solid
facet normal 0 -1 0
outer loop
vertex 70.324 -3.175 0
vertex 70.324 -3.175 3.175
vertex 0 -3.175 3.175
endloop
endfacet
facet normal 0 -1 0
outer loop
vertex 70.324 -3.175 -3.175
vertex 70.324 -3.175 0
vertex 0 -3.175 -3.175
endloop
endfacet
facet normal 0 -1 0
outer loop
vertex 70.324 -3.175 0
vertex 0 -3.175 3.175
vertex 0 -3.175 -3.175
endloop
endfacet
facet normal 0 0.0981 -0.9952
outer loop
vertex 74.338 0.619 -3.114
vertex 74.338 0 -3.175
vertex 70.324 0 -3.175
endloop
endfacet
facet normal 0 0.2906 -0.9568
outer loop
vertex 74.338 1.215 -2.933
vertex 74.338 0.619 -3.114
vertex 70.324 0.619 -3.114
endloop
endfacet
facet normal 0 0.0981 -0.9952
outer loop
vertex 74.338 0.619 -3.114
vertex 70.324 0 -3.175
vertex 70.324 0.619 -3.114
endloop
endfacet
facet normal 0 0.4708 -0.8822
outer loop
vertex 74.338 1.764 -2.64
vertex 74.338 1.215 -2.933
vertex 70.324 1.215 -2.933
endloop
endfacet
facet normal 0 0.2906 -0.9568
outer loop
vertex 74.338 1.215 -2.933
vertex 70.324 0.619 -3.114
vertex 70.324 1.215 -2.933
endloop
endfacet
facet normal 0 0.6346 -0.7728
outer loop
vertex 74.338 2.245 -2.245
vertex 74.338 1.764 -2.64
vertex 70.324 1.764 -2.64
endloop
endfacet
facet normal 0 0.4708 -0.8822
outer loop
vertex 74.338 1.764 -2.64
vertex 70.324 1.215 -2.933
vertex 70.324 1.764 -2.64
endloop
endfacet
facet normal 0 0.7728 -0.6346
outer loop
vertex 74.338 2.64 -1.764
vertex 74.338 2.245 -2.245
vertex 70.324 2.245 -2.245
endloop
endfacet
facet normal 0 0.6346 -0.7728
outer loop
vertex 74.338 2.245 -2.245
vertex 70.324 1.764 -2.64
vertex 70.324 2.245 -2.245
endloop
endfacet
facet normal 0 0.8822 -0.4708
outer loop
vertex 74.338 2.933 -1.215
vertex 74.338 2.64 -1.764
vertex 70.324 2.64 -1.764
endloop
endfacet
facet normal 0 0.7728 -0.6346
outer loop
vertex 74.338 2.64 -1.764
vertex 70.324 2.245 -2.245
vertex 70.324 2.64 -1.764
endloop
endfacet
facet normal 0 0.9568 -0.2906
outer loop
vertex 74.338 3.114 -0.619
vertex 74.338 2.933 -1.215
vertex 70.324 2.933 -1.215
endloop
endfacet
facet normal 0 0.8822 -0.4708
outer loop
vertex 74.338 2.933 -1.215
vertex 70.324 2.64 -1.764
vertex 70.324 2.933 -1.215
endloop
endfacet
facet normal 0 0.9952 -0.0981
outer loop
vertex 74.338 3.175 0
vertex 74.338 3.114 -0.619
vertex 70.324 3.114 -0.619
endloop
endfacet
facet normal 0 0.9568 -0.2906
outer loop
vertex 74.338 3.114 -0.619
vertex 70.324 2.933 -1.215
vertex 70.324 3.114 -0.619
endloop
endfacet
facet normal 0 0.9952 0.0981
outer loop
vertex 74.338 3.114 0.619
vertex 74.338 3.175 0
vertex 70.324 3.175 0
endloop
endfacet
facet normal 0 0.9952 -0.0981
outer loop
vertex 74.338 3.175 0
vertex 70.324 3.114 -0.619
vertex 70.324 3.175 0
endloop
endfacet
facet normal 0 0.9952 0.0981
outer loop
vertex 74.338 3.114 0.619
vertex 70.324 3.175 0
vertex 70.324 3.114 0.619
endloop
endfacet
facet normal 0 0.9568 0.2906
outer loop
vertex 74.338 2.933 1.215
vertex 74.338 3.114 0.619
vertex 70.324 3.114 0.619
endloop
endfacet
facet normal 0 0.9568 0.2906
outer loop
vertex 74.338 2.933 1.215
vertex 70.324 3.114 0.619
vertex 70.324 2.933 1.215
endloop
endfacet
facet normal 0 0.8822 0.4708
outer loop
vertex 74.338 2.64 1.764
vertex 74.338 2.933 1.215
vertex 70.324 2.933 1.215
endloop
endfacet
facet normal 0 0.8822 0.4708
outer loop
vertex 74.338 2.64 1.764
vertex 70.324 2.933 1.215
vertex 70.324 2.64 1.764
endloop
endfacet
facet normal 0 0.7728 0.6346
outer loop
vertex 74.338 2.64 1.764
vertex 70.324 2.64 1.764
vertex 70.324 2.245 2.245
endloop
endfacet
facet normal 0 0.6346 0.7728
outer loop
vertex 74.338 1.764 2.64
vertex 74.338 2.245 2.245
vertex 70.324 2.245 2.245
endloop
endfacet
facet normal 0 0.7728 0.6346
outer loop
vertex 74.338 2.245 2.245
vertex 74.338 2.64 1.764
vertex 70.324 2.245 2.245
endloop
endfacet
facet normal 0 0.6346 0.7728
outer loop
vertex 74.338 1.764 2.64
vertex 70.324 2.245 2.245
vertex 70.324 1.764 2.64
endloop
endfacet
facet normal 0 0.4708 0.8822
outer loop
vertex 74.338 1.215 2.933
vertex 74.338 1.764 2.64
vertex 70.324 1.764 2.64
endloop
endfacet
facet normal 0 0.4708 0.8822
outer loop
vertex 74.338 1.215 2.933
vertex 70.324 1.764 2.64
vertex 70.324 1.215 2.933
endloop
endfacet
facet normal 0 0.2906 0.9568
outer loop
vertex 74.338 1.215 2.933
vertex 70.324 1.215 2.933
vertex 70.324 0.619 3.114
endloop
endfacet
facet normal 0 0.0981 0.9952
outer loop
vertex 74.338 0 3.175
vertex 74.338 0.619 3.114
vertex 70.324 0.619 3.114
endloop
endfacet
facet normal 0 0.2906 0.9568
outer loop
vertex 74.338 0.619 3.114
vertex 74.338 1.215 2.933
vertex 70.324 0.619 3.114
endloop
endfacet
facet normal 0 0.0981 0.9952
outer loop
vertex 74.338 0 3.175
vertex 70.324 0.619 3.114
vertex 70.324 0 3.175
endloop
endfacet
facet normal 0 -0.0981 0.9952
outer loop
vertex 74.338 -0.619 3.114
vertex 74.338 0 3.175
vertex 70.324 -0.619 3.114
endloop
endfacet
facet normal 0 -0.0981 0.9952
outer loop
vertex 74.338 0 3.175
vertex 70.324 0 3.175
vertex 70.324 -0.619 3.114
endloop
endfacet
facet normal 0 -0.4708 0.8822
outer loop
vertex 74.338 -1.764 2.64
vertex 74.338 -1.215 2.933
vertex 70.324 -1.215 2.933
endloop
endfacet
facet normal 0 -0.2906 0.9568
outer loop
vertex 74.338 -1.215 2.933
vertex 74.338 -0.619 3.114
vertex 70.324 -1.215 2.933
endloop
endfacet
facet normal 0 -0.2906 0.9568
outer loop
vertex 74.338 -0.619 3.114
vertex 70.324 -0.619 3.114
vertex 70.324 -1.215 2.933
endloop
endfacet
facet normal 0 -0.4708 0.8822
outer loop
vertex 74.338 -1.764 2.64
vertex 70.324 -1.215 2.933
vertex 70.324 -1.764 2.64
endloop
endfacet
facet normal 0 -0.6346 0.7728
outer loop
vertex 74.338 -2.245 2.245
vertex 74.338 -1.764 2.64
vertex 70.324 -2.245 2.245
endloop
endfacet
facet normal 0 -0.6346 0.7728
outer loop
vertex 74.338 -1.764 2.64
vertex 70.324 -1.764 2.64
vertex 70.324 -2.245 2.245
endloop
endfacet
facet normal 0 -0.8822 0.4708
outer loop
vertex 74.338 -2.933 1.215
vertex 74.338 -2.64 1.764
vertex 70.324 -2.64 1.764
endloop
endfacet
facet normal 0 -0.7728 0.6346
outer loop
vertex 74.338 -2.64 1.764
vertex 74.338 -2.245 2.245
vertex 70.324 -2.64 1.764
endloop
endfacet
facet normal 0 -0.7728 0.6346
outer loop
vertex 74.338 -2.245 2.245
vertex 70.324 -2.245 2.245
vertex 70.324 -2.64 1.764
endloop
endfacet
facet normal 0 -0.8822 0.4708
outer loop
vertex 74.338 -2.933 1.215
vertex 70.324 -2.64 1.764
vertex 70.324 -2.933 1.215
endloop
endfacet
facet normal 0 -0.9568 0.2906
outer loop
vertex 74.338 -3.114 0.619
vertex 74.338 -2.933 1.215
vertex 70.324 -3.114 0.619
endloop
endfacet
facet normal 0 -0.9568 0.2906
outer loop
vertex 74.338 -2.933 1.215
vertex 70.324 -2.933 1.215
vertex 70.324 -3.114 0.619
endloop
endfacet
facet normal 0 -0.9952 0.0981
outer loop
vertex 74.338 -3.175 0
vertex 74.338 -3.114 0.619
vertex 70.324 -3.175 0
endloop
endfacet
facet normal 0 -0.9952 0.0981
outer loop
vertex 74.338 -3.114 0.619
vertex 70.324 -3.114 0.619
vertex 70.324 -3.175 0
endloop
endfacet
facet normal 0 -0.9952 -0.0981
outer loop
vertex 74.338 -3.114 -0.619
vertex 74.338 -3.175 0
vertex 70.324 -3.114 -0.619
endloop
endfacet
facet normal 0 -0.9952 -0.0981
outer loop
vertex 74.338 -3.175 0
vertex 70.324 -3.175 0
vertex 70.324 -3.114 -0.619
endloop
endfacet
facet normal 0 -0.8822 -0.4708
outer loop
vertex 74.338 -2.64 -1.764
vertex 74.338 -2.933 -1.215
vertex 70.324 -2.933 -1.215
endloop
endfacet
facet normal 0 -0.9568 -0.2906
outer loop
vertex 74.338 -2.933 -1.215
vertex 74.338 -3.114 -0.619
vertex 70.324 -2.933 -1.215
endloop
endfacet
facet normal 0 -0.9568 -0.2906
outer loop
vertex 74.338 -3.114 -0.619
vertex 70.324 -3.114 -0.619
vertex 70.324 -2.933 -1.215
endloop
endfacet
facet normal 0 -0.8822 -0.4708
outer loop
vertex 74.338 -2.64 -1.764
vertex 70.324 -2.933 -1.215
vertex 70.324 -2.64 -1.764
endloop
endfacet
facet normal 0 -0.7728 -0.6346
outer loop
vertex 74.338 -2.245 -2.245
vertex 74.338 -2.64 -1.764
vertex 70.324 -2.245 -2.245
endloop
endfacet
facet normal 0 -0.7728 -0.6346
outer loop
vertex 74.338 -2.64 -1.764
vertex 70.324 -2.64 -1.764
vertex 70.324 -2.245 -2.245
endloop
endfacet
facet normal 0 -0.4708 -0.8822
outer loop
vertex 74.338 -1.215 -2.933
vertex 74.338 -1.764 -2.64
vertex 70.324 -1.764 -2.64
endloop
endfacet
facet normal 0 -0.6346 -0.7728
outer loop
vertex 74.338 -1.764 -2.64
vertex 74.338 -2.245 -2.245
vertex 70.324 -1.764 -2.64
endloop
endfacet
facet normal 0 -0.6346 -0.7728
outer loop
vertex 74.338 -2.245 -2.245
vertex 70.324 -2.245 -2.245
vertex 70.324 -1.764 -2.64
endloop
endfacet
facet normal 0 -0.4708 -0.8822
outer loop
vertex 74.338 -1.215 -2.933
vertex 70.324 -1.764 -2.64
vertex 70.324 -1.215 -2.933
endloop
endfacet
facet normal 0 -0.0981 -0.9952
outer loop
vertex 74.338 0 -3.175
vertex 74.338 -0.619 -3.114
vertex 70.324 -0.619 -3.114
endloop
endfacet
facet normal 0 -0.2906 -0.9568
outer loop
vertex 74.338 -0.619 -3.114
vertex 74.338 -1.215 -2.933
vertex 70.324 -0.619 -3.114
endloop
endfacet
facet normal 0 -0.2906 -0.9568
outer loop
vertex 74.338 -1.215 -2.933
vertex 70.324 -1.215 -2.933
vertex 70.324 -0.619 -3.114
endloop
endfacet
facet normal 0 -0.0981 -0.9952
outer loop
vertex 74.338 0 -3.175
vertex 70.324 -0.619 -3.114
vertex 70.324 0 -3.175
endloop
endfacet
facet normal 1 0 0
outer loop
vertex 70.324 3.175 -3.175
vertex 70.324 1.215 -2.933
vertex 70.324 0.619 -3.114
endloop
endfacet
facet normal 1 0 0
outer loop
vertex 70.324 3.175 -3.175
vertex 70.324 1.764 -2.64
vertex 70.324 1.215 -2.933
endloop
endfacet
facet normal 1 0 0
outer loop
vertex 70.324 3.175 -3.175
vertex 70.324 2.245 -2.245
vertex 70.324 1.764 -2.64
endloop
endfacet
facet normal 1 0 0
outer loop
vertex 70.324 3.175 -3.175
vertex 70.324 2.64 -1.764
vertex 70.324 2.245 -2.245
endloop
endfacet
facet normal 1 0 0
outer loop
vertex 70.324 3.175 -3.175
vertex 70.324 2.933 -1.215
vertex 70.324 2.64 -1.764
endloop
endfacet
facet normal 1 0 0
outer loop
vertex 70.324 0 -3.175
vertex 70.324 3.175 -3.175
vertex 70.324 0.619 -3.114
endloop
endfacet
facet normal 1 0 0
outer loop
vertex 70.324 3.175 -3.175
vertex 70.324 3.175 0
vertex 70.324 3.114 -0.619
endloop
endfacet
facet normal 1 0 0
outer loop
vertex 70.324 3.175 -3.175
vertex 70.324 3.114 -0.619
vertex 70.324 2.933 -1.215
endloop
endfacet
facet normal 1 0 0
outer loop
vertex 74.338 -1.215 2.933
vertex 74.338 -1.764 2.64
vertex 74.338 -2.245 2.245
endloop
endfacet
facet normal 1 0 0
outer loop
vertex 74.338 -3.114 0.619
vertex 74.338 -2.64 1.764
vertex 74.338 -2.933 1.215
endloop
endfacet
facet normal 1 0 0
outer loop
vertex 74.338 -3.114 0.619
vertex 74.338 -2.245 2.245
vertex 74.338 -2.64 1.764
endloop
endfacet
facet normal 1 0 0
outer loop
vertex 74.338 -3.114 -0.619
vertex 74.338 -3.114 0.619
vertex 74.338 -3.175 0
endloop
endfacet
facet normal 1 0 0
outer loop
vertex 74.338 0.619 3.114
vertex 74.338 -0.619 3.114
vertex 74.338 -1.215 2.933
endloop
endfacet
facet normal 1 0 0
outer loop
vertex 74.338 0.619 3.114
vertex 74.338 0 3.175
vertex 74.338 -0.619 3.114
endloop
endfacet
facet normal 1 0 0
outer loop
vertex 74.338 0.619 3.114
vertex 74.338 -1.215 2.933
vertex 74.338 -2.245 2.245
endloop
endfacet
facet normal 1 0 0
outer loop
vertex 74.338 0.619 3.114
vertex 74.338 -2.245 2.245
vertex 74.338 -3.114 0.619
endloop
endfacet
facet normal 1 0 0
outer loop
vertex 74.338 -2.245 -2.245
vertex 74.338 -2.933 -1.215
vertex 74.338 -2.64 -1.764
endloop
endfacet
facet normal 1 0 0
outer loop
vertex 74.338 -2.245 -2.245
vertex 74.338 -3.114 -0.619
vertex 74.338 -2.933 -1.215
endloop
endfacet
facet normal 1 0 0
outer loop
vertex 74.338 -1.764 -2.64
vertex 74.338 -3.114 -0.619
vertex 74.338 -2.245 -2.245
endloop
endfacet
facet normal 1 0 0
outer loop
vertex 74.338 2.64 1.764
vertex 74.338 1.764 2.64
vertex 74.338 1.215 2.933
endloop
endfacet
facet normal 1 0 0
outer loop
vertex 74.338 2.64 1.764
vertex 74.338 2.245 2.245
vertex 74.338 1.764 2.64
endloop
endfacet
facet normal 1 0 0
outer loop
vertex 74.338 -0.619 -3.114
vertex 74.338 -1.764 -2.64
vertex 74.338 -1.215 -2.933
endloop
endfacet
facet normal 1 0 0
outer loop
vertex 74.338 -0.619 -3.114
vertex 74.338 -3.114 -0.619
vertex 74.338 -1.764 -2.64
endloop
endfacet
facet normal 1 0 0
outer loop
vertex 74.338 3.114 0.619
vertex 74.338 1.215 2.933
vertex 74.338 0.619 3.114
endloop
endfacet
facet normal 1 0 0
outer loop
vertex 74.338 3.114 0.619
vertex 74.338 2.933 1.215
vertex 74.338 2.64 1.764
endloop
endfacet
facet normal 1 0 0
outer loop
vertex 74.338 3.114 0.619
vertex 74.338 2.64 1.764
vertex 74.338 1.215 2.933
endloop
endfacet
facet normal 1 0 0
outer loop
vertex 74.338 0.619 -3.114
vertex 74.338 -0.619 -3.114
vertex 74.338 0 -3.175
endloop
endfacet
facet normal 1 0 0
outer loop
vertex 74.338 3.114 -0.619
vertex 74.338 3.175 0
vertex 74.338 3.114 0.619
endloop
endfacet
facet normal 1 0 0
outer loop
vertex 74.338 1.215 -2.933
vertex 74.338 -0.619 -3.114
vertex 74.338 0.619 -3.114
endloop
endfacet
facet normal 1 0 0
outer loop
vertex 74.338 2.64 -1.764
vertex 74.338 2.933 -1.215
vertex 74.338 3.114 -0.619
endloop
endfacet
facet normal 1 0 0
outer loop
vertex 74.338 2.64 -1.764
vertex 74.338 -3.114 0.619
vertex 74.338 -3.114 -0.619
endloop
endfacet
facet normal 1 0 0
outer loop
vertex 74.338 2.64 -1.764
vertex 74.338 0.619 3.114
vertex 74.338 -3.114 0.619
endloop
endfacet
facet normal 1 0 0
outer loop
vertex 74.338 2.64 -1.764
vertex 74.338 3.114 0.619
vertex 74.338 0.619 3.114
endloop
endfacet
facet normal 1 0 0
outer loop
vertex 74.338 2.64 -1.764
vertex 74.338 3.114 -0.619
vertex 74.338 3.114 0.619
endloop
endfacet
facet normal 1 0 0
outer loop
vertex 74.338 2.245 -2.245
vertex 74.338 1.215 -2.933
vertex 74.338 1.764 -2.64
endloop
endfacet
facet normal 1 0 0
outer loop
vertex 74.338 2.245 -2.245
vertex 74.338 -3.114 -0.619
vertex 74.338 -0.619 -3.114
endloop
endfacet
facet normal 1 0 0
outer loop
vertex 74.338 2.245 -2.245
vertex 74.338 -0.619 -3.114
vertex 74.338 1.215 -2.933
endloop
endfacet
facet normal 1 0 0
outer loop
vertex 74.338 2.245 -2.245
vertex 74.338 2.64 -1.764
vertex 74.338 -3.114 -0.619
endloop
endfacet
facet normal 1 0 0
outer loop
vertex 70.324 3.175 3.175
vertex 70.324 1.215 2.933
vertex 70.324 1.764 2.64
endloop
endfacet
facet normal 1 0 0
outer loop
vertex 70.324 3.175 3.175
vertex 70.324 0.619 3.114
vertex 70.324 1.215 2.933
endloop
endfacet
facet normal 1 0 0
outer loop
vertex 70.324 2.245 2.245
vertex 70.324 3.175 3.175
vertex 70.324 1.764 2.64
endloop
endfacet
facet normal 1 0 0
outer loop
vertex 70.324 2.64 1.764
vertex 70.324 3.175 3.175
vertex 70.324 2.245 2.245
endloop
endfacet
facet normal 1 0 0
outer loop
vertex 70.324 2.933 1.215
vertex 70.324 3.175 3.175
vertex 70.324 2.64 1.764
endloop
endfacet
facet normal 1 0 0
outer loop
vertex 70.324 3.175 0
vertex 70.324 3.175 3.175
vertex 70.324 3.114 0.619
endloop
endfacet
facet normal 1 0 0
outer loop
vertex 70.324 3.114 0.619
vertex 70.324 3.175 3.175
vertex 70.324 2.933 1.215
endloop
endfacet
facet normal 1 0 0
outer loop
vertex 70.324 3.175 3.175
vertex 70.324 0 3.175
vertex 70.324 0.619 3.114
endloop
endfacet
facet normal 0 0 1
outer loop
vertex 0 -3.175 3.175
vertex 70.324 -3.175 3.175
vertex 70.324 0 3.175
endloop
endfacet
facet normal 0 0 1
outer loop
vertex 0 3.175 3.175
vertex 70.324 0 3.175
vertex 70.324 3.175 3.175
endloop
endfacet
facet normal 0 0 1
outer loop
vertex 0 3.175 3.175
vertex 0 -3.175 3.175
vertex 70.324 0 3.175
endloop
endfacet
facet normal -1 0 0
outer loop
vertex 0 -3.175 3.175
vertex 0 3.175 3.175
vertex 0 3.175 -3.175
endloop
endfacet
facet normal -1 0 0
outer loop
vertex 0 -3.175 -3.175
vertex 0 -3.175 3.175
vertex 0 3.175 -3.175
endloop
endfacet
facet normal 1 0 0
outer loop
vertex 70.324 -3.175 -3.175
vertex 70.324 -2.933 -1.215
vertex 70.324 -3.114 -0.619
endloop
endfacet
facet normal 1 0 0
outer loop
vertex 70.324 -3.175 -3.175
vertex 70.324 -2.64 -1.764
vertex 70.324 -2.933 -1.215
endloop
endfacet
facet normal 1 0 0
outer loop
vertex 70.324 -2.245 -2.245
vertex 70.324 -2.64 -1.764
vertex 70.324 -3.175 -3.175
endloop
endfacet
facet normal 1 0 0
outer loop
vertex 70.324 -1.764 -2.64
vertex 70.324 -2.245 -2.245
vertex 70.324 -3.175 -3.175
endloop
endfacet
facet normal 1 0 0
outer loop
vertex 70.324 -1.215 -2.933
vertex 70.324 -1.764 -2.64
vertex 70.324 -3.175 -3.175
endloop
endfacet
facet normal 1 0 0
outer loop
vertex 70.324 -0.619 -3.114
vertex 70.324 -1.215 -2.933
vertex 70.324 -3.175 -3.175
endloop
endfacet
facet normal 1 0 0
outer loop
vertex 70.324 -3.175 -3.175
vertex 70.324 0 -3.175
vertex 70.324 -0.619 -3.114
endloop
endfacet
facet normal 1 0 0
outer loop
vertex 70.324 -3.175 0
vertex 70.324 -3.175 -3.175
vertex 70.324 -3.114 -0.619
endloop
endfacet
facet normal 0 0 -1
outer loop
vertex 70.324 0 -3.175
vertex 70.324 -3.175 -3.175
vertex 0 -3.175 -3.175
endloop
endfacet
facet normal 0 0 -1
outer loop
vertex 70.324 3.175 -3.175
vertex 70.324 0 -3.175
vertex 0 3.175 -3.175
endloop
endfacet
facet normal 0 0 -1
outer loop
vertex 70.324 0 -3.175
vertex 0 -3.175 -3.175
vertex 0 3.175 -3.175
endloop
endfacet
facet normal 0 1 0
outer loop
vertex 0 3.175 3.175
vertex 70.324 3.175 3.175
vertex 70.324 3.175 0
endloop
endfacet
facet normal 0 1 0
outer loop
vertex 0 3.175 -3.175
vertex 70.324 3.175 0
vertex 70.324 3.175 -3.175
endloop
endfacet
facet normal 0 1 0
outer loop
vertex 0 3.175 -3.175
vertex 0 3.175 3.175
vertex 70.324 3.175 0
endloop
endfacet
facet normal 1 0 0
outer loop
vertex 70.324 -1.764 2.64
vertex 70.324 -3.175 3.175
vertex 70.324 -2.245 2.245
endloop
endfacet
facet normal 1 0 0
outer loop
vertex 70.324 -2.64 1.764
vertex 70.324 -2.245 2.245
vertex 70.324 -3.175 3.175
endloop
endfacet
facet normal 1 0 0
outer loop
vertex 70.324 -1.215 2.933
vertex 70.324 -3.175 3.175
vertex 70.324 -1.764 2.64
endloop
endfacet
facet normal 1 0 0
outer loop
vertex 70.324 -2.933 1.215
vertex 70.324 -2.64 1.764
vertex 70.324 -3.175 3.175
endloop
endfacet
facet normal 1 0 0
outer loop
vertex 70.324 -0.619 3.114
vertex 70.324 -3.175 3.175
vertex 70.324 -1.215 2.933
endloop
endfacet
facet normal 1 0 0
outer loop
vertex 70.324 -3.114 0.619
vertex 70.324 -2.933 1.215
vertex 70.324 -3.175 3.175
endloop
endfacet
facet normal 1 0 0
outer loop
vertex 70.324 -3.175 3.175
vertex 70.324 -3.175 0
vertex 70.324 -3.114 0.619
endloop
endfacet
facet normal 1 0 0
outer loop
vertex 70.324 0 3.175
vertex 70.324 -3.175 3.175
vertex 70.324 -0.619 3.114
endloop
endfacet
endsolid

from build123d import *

# Parameters (mm, degrees)
SKETCH1_W           = 6.35
SKETCH1_H           = 6.35
BOSS_EXTRUDE1_DEPTH = 74.3375
CUT_EXTRUDE1_START  = -4.0132
SKETCH2_W           = 6.604
SKETCH2_H           = 6.604
SKETCH2_R           = 3.175
CUT_EXTRUDE1_DEPTH  = 4.0132


with BuildPart() as part:
    # Sketch1 → Boss-Extrude1 (new body)
    with BuildSketch(Plane(origin=(0, 0, 0), x_dir=(0, 0, -1), z_dir=(1, 0, 0))):
        Rectangle(SKETCH1_W, SKETCH1_H)
    extrude(amount=BOSS_EXTRUDE1_DEPTH)

    # Sketch2 → Cut-Extrude1 (cut)
    with BuildSketch(Plane(origin=(74.3375, 0, 0), x_dir=(0, 0, -1), z_dir=(1, 0, 0)).offset(CUT_EXTRUDE1_START)):
        Rectangle(SKETCH2_W, SKETCH2_H)
        Circle(SKETCH2_R, mode=Mode.SUBTRACT)
    extrude(amount=CUT_EXTRUDE1_DEPTH, mode=Mode.SUBTRACT)


solid = part.part
